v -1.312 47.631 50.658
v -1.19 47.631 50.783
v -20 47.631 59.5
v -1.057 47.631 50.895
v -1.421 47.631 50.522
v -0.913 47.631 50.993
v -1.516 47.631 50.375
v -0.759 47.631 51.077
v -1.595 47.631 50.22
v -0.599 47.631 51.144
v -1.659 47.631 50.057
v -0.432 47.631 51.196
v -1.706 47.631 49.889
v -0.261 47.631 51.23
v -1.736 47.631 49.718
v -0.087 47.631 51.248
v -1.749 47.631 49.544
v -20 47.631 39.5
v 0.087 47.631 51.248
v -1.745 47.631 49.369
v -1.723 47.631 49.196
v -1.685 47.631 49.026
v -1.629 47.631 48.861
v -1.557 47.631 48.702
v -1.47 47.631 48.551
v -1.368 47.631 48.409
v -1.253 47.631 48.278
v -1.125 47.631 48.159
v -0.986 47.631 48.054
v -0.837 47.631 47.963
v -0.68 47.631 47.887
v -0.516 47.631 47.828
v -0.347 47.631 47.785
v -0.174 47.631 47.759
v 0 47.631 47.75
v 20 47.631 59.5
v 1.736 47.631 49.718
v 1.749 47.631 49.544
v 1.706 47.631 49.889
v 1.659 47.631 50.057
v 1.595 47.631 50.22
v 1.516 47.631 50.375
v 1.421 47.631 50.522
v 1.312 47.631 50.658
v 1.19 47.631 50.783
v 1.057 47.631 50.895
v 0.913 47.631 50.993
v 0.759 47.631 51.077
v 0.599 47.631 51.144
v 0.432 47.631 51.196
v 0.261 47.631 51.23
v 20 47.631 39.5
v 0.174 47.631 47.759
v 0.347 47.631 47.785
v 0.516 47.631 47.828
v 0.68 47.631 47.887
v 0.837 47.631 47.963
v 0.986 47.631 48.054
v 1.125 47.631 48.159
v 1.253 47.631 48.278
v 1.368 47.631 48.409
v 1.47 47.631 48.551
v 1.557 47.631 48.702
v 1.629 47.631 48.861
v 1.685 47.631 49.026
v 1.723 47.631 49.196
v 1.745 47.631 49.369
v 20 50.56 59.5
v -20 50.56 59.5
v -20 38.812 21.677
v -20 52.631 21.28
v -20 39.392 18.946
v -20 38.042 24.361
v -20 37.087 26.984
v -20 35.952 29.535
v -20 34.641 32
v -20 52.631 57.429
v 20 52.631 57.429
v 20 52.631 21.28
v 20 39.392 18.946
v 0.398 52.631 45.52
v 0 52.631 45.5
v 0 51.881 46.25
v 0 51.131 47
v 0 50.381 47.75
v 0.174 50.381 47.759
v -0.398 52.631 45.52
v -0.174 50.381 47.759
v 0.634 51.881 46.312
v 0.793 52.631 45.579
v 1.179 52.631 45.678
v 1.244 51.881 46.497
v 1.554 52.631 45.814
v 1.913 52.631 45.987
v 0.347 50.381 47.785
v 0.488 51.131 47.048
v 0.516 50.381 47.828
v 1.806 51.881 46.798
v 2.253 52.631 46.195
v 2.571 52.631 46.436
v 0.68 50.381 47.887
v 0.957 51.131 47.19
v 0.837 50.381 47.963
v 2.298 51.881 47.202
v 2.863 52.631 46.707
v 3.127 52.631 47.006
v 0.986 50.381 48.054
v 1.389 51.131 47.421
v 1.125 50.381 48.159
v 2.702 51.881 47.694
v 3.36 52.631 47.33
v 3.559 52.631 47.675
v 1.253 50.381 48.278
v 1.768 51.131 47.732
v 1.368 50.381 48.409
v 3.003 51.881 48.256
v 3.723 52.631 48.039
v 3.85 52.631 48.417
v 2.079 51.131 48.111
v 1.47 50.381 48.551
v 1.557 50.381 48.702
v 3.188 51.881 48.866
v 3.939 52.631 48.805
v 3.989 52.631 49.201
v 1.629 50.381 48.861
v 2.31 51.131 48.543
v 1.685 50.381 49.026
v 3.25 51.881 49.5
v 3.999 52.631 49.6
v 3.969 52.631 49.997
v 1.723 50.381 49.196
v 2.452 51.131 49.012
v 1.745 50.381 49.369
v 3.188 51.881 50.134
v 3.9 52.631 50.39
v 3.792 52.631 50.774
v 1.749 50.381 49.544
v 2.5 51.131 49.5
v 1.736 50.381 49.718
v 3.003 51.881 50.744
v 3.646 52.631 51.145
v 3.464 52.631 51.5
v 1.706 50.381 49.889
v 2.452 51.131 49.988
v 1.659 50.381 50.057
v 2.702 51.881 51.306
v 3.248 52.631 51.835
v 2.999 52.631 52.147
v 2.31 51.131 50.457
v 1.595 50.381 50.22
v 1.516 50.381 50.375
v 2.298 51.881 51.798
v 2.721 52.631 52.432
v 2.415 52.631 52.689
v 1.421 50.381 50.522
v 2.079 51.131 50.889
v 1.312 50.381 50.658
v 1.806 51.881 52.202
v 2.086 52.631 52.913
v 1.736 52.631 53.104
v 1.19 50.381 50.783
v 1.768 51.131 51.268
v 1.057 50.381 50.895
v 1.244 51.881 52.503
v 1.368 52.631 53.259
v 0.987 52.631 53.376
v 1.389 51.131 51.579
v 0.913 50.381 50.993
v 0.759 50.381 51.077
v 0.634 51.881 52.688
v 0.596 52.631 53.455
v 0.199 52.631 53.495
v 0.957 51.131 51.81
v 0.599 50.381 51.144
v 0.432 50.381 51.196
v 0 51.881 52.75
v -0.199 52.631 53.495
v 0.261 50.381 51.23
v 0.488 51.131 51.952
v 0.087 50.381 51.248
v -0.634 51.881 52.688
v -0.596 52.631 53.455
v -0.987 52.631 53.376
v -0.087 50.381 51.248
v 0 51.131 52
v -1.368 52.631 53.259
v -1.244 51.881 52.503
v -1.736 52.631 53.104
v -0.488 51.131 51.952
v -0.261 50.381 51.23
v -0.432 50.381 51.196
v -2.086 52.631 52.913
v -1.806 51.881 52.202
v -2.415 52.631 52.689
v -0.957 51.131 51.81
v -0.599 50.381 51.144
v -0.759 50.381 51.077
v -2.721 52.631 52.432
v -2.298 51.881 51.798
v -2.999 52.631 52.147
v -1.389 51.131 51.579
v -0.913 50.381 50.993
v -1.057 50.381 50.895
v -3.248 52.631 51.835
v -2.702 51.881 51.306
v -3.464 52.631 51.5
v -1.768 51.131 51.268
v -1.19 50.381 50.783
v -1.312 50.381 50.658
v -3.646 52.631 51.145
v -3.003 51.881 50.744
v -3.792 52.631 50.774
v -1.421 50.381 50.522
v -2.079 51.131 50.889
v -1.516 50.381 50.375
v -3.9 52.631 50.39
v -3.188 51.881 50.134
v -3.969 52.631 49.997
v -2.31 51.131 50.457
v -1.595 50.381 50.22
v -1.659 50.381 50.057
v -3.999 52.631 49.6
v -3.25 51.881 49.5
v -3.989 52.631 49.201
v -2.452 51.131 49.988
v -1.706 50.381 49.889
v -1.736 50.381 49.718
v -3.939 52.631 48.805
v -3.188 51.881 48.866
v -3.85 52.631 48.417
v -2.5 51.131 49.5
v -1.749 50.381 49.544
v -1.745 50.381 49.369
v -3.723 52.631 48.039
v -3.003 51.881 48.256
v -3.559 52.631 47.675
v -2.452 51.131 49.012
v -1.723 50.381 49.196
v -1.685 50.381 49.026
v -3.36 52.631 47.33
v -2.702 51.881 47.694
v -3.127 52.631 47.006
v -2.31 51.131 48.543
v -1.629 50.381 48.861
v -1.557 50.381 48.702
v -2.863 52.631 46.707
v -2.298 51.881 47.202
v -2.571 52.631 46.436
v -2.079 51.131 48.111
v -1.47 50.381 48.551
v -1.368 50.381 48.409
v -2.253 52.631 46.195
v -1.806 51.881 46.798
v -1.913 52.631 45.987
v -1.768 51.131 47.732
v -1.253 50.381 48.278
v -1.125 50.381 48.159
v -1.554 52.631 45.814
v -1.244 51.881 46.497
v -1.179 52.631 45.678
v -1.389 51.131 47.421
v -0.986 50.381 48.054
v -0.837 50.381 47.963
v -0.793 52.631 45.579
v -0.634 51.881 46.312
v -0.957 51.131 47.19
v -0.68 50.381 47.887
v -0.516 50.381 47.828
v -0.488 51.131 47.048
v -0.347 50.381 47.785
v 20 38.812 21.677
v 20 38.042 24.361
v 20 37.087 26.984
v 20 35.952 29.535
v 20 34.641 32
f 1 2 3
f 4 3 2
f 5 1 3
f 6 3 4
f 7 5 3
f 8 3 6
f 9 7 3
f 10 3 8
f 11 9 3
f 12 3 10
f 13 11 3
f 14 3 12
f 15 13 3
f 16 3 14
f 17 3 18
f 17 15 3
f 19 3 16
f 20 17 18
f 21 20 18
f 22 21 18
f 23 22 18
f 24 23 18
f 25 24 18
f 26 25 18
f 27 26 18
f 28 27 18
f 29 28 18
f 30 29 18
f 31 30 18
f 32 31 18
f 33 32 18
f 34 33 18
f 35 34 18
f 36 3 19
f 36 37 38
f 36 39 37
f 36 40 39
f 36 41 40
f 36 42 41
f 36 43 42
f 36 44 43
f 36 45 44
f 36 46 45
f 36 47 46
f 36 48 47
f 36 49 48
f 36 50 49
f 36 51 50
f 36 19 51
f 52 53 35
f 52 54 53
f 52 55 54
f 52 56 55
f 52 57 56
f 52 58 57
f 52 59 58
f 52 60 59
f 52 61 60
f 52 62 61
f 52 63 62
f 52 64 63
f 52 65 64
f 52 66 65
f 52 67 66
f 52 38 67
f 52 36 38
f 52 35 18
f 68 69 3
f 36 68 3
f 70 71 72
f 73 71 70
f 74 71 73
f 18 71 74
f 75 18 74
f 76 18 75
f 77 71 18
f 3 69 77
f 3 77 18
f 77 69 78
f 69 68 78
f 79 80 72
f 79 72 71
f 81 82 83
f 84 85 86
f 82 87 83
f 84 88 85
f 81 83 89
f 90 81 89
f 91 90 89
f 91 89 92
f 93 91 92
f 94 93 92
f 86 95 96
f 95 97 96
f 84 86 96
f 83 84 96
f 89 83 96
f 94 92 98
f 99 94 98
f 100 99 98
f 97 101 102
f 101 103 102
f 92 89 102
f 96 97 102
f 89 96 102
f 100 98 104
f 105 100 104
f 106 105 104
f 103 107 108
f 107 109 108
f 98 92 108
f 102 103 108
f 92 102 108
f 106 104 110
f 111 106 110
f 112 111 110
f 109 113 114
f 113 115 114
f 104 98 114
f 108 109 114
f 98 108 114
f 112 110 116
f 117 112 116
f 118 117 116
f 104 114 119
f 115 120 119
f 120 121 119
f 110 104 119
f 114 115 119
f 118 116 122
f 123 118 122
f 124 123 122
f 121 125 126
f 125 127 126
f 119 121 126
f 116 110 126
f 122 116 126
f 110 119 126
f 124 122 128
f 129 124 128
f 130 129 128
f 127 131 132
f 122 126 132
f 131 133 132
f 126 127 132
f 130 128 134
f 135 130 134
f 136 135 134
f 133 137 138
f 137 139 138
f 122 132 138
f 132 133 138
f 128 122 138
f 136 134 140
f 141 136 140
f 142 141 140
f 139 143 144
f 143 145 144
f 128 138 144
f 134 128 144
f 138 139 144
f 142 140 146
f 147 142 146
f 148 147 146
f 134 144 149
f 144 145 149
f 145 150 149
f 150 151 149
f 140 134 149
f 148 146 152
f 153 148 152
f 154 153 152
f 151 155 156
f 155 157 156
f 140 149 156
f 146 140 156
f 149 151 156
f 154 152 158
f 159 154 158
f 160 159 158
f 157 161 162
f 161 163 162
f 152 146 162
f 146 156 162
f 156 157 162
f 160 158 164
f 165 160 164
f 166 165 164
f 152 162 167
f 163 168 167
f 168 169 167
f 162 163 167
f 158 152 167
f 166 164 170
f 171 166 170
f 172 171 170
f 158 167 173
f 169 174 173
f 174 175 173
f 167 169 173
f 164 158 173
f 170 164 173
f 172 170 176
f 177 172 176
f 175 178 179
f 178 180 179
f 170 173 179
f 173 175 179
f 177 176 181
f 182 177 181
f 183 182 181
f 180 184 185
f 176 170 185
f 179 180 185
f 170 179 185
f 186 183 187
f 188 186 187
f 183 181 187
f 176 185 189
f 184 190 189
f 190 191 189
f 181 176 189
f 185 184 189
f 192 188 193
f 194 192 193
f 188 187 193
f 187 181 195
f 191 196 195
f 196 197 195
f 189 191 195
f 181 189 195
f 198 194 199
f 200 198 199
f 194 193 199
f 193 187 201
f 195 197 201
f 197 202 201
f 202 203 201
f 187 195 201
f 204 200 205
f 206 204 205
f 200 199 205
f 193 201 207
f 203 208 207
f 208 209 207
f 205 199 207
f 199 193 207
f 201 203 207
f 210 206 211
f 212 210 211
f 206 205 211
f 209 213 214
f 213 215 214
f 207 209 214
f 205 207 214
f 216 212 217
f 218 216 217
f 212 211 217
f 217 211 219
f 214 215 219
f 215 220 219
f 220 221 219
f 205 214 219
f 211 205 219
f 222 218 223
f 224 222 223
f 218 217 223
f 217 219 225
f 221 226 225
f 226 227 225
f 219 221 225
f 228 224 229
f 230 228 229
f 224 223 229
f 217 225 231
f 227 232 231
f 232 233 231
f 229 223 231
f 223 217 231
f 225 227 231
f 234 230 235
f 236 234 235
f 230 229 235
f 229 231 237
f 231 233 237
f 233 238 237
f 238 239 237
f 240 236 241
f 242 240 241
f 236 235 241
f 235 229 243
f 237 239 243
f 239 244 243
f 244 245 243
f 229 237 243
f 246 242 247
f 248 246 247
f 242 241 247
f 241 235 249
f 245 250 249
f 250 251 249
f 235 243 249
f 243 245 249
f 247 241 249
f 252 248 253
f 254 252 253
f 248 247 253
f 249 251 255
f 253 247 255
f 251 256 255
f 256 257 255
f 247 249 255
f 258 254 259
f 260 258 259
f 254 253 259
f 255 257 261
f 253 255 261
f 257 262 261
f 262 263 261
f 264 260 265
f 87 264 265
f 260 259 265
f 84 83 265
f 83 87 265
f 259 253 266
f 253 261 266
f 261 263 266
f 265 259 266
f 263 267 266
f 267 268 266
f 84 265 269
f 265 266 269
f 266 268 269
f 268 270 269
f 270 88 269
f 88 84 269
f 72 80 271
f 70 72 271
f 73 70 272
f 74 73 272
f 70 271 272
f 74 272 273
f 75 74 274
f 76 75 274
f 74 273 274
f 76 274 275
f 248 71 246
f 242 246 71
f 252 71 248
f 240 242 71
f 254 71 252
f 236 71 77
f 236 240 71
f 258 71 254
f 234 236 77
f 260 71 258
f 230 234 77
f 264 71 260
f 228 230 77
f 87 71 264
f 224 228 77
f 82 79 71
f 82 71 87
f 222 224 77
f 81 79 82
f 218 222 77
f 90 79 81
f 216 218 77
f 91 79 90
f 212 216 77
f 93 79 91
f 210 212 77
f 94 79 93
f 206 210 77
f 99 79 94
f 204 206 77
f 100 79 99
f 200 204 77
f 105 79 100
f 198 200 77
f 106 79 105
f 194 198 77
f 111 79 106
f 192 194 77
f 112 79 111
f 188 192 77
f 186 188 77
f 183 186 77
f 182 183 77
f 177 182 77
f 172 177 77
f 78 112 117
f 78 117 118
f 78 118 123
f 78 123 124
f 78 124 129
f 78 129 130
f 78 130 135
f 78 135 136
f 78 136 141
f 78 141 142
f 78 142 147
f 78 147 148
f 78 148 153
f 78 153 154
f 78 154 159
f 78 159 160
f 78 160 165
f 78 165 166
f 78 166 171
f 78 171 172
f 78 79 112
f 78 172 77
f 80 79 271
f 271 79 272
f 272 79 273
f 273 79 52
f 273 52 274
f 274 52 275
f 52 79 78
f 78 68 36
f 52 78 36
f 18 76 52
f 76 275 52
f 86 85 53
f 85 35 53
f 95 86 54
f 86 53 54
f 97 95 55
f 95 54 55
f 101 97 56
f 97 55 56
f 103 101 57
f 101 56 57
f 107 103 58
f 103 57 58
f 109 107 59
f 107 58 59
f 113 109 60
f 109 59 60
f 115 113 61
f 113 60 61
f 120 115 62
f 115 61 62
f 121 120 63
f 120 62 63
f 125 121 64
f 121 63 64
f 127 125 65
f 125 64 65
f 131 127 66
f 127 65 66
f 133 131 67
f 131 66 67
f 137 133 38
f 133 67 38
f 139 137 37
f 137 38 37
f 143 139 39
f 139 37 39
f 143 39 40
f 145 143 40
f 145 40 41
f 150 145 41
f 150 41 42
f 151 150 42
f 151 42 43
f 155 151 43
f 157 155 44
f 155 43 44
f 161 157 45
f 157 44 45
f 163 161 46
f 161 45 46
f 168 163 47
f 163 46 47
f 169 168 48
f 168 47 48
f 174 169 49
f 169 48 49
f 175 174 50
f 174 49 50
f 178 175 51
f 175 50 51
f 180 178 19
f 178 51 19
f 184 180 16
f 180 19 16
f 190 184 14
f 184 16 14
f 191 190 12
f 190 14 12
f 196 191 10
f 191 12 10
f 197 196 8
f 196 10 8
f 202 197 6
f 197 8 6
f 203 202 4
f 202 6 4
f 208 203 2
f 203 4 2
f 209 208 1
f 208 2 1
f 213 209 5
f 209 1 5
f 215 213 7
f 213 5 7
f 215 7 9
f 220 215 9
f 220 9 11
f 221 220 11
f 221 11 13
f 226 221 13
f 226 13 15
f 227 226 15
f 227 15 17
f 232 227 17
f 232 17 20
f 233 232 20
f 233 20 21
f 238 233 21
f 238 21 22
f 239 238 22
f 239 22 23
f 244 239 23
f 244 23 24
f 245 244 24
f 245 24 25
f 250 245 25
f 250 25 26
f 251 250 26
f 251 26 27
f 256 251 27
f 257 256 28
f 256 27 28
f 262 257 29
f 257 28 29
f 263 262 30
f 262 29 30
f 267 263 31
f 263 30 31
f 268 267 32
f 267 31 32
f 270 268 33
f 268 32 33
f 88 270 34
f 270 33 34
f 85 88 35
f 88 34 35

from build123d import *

# Parameters (mm, degrees)
PAD_DEPTH        = 20
HOLE_D           = 3.5
HOLE_CSINK_D     = 8
HOLE_CSINK_ANGLE = 90


with BuildPart() as part:
    # Sketch → Pad (new body, symmetric)
    with BuildSketch(Plane.YZ):
        with BuildLine():
            ThreePointArc((39.39231, 18.945927), (37.587705, 25.680806), (34.641016, 32))
            Line((34.641016, 32), (47.631397, 39.5))
            Line((47.631397, 59.5), (47.631397, 39.5))
            Line((50.560329, 59.5), (47.631397, 59.5))
            Line((50.560329, 59.5), (52.631397, 57.428932))
            Line((52.631397, 21.280335), (52.631397, 57.428932))
            Line((39.39231, 18.945927), (52.631397, 21.280335))
        make_face()
    extrude(amount=PAD_DEPTH, both=True)

    # Hole (through all)
    with Locations(Plane.ZX.offset(52.631397)):
        with Locations((49.5, 0)):
            CounterSinkHole(HOLE_D / 2, HOLE_CSINK_D / 2, counter_sink_angle=HOLE_CSINK_ANGLE)


solid = part.part
